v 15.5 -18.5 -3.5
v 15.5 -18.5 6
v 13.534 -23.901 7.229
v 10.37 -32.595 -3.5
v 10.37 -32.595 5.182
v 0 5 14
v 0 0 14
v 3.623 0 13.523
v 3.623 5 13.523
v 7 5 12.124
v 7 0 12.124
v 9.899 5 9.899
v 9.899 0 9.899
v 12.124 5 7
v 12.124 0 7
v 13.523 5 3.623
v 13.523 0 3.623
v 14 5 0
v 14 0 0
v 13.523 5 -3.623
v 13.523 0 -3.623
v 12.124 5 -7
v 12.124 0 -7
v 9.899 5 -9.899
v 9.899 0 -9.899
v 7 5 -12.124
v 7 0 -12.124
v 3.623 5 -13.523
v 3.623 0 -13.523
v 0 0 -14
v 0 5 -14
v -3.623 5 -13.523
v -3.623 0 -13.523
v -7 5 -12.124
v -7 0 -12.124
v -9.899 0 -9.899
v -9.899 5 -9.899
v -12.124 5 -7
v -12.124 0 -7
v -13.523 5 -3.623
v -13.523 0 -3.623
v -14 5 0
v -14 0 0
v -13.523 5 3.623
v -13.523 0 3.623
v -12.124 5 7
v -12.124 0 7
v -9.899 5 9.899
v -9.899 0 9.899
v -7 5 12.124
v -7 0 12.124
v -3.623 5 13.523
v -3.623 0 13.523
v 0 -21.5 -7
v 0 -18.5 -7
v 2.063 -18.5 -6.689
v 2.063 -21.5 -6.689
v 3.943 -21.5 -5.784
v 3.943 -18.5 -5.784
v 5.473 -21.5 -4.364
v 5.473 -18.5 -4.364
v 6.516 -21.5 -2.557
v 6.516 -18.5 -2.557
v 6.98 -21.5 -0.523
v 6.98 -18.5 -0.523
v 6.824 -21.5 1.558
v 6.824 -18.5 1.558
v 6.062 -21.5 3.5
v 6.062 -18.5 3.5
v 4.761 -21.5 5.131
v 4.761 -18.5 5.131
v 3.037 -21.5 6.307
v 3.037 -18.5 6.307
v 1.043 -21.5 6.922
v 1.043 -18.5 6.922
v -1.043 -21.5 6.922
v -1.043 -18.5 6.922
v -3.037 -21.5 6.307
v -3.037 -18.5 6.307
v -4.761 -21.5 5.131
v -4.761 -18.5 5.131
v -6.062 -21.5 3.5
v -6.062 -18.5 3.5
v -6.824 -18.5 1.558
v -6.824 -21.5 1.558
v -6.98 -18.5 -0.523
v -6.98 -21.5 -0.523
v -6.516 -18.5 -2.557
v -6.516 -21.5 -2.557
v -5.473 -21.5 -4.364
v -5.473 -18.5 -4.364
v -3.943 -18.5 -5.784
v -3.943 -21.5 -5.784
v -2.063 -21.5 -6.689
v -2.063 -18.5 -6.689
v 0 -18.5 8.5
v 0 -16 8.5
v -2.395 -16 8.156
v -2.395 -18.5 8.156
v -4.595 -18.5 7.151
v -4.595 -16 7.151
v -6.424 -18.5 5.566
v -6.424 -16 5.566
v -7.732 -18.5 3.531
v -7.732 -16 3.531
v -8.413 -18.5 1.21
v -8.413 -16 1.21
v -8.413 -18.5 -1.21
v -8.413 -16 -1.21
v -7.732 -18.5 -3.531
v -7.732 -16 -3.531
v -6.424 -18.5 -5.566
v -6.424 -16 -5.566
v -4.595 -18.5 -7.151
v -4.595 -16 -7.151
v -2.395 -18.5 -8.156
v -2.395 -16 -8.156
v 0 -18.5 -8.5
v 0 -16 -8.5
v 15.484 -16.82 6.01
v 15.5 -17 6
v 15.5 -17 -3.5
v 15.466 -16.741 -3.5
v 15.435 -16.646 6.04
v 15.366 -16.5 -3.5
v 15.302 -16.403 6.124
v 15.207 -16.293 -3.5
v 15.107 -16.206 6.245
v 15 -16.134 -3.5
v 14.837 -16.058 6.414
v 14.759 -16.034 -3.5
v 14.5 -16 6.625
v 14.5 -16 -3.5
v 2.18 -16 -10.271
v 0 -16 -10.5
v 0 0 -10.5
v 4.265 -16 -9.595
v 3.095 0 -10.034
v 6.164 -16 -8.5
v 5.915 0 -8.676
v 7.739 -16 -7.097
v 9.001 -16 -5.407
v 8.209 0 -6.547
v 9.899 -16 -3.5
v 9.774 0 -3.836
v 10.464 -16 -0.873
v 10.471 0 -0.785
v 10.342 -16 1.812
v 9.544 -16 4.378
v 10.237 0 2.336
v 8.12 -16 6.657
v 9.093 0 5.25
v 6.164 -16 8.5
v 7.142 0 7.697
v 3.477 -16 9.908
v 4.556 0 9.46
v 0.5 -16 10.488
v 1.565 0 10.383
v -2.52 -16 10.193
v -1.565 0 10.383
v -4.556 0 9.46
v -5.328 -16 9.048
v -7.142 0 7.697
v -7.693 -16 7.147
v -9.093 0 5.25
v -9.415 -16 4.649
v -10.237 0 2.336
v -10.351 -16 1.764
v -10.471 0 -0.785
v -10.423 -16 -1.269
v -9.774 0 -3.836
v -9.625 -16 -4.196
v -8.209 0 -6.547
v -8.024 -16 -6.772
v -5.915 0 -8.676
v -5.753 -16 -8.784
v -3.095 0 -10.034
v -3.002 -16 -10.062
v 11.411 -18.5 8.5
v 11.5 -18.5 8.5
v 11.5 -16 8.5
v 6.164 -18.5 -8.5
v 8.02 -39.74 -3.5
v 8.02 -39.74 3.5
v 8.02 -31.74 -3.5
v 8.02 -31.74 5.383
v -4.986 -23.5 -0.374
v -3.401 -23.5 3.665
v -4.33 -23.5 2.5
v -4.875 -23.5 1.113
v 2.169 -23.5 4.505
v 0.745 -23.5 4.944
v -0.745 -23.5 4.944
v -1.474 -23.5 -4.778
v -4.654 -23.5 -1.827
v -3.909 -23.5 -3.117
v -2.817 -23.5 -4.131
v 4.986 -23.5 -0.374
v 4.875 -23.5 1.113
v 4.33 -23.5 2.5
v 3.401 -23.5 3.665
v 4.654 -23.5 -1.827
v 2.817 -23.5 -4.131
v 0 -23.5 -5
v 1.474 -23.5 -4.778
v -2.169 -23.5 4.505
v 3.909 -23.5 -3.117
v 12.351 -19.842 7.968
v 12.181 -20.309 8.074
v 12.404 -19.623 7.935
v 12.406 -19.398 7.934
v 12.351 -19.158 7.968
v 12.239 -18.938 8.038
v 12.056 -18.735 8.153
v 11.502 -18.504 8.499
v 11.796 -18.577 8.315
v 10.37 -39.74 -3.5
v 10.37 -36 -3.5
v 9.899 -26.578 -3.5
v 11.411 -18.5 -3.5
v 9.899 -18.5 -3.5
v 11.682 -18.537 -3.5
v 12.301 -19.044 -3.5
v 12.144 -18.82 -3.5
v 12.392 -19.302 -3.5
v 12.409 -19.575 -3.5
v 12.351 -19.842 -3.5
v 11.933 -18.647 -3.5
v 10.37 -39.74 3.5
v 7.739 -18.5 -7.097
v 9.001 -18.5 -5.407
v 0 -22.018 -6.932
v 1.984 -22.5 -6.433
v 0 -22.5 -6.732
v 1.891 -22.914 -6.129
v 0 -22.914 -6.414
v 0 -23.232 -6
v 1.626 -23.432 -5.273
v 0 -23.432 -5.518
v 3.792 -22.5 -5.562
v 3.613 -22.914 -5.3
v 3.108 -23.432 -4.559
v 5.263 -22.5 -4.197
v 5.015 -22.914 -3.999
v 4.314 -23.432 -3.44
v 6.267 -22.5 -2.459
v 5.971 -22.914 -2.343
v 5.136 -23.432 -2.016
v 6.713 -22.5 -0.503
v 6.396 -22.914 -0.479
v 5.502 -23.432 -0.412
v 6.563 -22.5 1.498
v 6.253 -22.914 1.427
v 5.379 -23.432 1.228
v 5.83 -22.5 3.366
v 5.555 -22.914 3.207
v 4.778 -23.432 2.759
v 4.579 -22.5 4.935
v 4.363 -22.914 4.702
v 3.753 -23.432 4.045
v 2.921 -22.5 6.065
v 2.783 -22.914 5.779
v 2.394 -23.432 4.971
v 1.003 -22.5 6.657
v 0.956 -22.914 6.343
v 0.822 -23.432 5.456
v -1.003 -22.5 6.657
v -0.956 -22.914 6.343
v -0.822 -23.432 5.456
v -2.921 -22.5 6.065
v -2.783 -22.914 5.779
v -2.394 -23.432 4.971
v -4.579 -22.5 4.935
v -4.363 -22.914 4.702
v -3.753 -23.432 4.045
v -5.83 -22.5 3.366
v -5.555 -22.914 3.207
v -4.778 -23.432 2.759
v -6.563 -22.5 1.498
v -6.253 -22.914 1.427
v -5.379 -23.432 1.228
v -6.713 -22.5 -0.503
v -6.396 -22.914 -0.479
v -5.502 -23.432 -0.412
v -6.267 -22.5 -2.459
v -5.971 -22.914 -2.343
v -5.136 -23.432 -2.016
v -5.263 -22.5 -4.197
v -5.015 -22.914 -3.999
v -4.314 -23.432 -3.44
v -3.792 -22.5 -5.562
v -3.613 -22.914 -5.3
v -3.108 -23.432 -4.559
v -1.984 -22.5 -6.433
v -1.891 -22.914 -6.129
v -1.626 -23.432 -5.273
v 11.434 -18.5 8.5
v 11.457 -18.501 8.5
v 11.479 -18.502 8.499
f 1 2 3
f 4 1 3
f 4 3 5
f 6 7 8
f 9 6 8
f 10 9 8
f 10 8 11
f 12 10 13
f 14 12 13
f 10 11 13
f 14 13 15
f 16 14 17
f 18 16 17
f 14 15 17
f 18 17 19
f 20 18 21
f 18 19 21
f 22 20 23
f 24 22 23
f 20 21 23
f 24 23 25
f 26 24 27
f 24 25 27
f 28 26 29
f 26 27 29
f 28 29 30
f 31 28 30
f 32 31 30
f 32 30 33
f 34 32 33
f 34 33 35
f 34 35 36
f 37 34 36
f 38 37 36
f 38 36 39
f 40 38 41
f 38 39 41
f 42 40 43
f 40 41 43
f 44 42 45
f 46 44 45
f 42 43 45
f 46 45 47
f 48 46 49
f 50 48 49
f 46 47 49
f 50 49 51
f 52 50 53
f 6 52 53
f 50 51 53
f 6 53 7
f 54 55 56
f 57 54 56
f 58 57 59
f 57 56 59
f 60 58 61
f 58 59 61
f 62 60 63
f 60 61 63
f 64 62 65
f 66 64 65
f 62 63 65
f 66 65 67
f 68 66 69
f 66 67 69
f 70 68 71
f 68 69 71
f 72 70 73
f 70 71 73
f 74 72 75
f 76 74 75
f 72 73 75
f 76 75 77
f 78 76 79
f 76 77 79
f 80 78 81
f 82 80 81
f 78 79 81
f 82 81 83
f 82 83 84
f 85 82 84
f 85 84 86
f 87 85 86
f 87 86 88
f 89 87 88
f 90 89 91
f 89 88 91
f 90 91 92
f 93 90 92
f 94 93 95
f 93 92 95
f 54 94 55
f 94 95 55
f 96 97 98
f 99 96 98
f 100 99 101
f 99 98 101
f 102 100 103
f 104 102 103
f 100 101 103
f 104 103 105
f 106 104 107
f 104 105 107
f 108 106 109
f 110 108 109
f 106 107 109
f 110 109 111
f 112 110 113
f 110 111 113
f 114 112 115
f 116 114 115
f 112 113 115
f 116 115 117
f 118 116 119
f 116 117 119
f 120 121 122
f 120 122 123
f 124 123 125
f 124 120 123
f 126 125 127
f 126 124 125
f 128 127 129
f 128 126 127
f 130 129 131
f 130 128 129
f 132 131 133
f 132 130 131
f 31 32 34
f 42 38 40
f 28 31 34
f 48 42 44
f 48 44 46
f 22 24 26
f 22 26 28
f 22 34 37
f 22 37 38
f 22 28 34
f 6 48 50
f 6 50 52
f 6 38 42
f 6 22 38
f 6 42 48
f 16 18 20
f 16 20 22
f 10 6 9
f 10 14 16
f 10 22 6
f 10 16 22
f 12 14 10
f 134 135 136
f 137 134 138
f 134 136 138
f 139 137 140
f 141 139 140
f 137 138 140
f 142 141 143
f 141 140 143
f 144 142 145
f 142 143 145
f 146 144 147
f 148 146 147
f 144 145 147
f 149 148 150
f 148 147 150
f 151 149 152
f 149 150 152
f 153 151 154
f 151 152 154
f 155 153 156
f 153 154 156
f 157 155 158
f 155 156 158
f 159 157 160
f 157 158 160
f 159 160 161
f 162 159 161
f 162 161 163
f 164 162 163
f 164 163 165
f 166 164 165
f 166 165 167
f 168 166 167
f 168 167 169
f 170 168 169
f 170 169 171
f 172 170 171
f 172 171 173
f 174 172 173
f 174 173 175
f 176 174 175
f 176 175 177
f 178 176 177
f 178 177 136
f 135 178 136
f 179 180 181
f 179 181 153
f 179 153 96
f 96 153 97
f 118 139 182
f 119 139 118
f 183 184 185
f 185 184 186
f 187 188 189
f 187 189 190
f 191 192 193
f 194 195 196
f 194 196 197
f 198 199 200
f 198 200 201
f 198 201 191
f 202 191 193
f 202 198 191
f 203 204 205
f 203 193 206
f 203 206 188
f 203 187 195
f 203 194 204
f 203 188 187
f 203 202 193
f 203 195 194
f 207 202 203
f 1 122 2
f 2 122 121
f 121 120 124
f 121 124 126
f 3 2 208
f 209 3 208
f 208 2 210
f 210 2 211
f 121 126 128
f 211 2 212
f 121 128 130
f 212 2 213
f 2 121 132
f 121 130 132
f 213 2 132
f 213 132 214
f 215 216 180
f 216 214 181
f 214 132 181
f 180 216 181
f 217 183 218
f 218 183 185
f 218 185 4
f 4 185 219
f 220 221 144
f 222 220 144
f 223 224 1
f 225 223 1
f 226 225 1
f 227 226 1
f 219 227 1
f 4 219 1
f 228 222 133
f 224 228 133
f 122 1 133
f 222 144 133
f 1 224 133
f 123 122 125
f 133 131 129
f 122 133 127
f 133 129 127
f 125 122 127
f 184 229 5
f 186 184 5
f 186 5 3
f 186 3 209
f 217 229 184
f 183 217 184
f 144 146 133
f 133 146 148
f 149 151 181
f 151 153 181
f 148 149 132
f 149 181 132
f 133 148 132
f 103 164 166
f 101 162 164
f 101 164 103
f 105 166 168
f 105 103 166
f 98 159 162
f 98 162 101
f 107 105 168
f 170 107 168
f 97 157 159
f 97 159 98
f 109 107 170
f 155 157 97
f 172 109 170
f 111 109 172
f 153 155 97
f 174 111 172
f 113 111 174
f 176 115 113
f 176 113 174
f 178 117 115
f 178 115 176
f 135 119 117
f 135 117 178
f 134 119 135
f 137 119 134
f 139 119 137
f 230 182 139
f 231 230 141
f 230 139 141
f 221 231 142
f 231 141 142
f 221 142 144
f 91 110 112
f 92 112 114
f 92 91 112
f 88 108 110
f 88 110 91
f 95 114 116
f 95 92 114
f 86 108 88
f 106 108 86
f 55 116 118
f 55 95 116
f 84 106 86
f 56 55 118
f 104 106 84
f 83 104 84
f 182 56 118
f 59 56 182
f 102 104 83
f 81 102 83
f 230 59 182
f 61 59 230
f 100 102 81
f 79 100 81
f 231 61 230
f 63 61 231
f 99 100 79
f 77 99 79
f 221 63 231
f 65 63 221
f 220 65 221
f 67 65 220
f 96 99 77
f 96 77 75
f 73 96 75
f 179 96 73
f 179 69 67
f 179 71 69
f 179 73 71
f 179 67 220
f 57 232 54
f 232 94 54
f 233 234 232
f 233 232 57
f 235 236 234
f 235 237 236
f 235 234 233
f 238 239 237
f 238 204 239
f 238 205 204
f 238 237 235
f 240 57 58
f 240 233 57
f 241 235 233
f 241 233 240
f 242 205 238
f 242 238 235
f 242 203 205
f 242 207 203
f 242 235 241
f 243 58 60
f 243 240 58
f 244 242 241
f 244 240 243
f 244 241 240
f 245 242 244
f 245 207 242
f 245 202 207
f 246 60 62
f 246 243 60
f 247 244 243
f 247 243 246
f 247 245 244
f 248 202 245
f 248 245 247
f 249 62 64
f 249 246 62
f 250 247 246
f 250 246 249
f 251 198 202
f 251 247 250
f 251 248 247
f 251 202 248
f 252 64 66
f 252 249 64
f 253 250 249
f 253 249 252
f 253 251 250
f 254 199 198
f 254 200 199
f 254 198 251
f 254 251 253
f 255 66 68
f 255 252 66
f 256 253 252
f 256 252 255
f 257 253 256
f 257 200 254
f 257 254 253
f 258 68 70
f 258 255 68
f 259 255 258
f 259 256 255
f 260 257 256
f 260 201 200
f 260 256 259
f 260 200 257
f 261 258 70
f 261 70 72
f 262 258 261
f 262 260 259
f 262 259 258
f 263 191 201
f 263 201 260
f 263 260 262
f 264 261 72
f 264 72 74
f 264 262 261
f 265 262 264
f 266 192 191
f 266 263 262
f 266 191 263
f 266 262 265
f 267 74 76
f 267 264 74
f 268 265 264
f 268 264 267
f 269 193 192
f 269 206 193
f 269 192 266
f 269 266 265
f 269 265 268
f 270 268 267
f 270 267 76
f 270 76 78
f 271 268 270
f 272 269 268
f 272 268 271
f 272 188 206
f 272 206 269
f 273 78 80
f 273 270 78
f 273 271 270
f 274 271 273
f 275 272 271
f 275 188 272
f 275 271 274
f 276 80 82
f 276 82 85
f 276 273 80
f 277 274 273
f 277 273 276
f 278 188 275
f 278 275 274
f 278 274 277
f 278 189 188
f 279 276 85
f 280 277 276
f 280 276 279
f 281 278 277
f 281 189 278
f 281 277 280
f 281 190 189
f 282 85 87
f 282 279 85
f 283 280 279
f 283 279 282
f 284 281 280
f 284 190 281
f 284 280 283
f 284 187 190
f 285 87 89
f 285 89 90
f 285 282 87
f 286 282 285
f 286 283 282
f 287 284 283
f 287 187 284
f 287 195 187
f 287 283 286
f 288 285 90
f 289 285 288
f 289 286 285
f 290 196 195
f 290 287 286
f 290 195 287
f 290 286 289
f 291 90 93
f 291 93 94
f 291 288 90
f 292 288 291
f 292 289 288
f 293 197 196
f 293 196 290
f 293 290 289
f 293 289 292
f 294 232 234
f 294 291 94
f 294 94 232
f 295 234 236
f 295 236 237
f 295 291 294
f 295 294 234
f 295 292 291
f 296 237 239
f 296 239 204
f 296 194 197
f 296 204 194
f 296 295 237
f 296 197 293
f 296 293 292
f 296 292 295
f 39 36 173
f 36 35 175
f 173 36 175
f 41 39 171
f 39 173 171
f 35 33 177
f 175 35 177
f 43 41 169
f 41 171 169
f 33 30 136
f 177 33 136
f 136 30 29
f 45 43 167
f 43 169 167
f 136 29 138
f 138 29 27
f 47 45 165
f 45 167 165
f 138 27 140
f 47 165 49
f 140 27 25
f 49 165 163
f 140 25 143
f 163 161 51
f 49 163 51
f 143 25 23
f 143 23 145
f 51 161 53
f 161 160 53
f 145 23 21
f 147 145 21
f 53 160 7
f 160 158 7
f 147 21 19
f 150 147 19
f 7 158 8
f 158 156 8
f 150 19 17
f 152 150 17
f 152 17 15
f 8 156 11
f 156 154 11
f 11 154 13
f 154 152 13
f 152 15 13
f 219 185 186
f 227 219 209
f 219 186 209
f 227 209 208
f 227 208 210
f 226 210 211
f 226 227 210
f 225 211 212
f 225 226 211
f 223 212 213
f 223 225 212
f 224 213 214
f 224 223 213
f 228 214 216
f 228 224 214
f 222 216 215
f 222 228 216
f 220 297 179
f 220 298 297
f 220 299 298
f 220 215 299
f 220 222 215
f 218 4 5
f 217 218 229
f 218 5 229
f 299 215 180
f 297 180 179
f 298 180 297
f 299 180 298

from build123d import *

# Parameters (mm, degrees)
SKETCH1_R           = 14
BOSS_EXTRUDE1_DEPTH = 5
SKETCH2_R           = 10.5
BOSS_EXTRUDE2_DEPTH = 16
SKETCH3_R           = 8.5
BOSS_EXTRUDE3_DEPTH = 2.5
SKETCH4_R           = 7
BOSS_EXTRUDE4_DEPTH = 5
FILLET1_R           = 2
BOSS_EXTRUDE5_START = -2.5
BOSS_EXTRUDE5_DEPTH = 2.5
BOSS_EXTRUDE7_DEPTH = 17
FILLET3_R           = 1
CUT_EXTRUDE1_REACH  = 53.435
CUT_EXTRUDE2_DEPTH  = 20
SKETCH10_W          = 8.800813703
SKETCH10_H          = 15.870840907
CUT_EXTRUDE3_DEPTH  = 10


with BuildPart() as part:
    # Sketch1 → Boss-Extrude1 (new body)
    with BuildSketch(Plane(origin=(0, 0, 0), x_dir=(1, 0, 0), z_dir=(0, 1, 0))):
        with Locations(Location((0, 0, 0), (0, 0, 270))):
            Circle(SKETCH1_R)
    extrude(amount=BOSS_EXTRUDE1_DEPTH)

    # Sketch2 → Boss-Extrude2 (add)
    with BuildSketch(Plane.XZ):
        with Locations(Location((0, 0, 0), (0, 0, 270))):
            Circle(SKETCH2_R)
    extrude(amount=BOSS_EXTRUDE2_DEPTH)

    # Sketch3 → Boss-Extrude3 (add)
    with BuildSketch(Plane.XZ.offset(16)):
        with Locations(Location((0, 0, 0), (0, 0, 270))):
            Circle(SKETCH3_R)
    extrude(amount=BOSS_EXTRUDE3_DEPTH)

    # Sketch4 → Boss-Extrude4 (add)
    with BuildSketch(Plane.XZ.offset(18.5)):
        with Locations(Location((0, 0, 0), (0, 0, 270))):
            Circle(SKETCH4_R)
    extrude(amount=BOSS_EXTRUDE4_DEPTH)

    # Fillet1
    fillet1_edges = [part.edges().sort_by_distance(p)[0] for p in [
        (0, -23.5, 7),
    ]]
    fillet(fillet1_edges, radius=FILLET1_R)

    # Sketch5 → Boss-Extrude5 (add)
    with BuildSketch(Plane.XZ.offset(18.5).offset(BOSS_EXTRUDE5_START)):
        with BuildLine():
            Line((15.5, 8.5), (0, 8.5))
            ThreePointArc((0, 8.5), (6.01040764, 6.01040764), (8.5, 0))
            ThreePointArc((8.5, 0), (6.01040764, -6.01040764), (0, -8.5))
            Line((0, -8.5), (15.5, -8.5))
            Line((15.5, -8.5), (15.5, 8.5))
        make_face()
    extrude(amount=BOSS_EXTRUDE5_DEPTH)

    # Sketch7 → Boss-Extrude7 (add)
    with BuildSketch(Plane.XY.offset(8.5)):
        Polygon((15.5, -18.5), (10.36969785, -32.595389312), (10.36969785, -39.740338953), (8.020466298, -39.740338953), (8.020466298, -31.740338953), (12.839555569, -18.5), align=None)
    extrude(amount=-BOSS_EXTRUDE7_DEPTH)

    # Fillet3
    fillet3_edges = [part.edges().sort_by_distance(p)[0] for p in [
        (15.5, -16, 0),
        (12.839555569, -18.5, 0),
    ]]
    fillet(fillet3_edges, radius=FILLET3_R)

    # Cut-Extrude1: up to this face of the body (flat: up to its plane)
    cut_extrude1_end = Plane(part.part.faces().sort_by_distance((8.020466298, -35.740338953, 0))[0])
    # Sketch8 → Cut-Extrude1 (cut, up to the picked face)
    with BuildSketch(Plane(origin=(15.5, 0, 0), x_dir=(0, 0, -1), z_dir=(1, 0, 0)), mode=Mode.PRIVATE) as cut_extrude1_sk1:
        Polygon((-3.5, -39.740338953), (-8.5, -18.5), (-8.5, -32.595389312), (-8.5, -39.740338953), align=None)
    cut_extrude1_tool1 = split(extrude(cut_extrude1_sk1.sketch, amount=-CUT_EXTRUDE1_REACH, mode=Mode.PRIVATE), bisect_by=cut_extrude1_end, keep=Keep.BOTH, mode=Mode.PRIVATE)
    # Sketch8 → Cut-Extrude1 (cut, up to the picked face)
    with BuildSketch(Plane(origin=(15.5, 0, 0), x_dir=(0, 0, -1), z_dir=(1, 0, 0)), mode=Mode.PRIVATE) as cut_extrude1_sk2:
        Polygon((8.5, -32.595389312), (8.5, -18.5), (3.5, -39.740338953), (8.5, -39.740338953), align=None)
    cut_extrude1_tool2 = split(extrude(cut_extrude1_sk2.sketch, amount=-CUT_EXTRUDE1_REACH, mode=Mode.PRIVATE), bisect_by=cut_extrude1_end, keep=Keep.BOTH, mode=Mode.PRIVATE)
    add(cut_extrude1_tool1.solids().sort_by(Axis((15.5, -32.660226, 6.833333), (-1, 0, 0)))[0], mode=Mode.SUBTRACT)
    add(cut_extrude1_tool2.solids().sort_by(Axis((15.5, -32.660226, -6.833333), (-1, 0, 0)))[0], mode=Mode.SUBTRACT)

    # Sketch9 → Cut-Extrude2 (cut)
    with BuildSketch(Plane(origin=(0, -16, 0), x_dir=(1, 0, 0), z_dir=(0, 1, 0))):
        Polygon((14.5, 8.5), (14.5, 6.625), (15.5, 6), (15.5, 8.5), align=None)
        Polygon((14.5, 8.5), (11.5, 8.5), (14.5, 6.625), align=None)
        Polygon((14.5, -6.625), (14.5, -8.5), (15.5, -8.5), (15.5, -6), align=None)
        Polygon((14.5, -6.625), (11.5, -8.5), (14.5, -8.5), align=None)
        Polygon((14.5, 6.625), (14.5, 3.5), (15.5, 3.5), (15.5, 6), align=None)
        Polygon((11.5, 8.5), (11.5, 3.5), (14.5, 3.5), (14.5, 6.625), align=None)
        with BuildLine():
            ThreePointArc((6.164414003, 8.5), (8.412032608, 6.283924522), (9.899494937, 3.5))
            Line((9.899494937, 3.5), (10.36969785, 3.5))
            Line((10.36969785, 3.5), (11.5, 3.5))
            Line((11.5, 3.5), (11.5, 8.5))
            Line((11.5, 8.5), (6.164414003, 8.5))
        make_face()
    extrude(amount=-CUT_EXTRUDE2_DEPTH, mode=Mode.SUBTRACT)

    # Sketch10 → Cut-Extrude3 (cut)
    with BuildSketch(Plane(origin=(10.36969785, 0, 0), x_dir=(0, 0, -1), z_dir=(1, 0, 0))):
        with Locations((7.900406852, -31.8049185)):
            Rectangle(SKETCH10_W, SKETCH10_H)
    extrude(amount=-CUT_EXTRUDE3_DEPTH, mode=Mode.SUBTRACT)


solid = part.part
